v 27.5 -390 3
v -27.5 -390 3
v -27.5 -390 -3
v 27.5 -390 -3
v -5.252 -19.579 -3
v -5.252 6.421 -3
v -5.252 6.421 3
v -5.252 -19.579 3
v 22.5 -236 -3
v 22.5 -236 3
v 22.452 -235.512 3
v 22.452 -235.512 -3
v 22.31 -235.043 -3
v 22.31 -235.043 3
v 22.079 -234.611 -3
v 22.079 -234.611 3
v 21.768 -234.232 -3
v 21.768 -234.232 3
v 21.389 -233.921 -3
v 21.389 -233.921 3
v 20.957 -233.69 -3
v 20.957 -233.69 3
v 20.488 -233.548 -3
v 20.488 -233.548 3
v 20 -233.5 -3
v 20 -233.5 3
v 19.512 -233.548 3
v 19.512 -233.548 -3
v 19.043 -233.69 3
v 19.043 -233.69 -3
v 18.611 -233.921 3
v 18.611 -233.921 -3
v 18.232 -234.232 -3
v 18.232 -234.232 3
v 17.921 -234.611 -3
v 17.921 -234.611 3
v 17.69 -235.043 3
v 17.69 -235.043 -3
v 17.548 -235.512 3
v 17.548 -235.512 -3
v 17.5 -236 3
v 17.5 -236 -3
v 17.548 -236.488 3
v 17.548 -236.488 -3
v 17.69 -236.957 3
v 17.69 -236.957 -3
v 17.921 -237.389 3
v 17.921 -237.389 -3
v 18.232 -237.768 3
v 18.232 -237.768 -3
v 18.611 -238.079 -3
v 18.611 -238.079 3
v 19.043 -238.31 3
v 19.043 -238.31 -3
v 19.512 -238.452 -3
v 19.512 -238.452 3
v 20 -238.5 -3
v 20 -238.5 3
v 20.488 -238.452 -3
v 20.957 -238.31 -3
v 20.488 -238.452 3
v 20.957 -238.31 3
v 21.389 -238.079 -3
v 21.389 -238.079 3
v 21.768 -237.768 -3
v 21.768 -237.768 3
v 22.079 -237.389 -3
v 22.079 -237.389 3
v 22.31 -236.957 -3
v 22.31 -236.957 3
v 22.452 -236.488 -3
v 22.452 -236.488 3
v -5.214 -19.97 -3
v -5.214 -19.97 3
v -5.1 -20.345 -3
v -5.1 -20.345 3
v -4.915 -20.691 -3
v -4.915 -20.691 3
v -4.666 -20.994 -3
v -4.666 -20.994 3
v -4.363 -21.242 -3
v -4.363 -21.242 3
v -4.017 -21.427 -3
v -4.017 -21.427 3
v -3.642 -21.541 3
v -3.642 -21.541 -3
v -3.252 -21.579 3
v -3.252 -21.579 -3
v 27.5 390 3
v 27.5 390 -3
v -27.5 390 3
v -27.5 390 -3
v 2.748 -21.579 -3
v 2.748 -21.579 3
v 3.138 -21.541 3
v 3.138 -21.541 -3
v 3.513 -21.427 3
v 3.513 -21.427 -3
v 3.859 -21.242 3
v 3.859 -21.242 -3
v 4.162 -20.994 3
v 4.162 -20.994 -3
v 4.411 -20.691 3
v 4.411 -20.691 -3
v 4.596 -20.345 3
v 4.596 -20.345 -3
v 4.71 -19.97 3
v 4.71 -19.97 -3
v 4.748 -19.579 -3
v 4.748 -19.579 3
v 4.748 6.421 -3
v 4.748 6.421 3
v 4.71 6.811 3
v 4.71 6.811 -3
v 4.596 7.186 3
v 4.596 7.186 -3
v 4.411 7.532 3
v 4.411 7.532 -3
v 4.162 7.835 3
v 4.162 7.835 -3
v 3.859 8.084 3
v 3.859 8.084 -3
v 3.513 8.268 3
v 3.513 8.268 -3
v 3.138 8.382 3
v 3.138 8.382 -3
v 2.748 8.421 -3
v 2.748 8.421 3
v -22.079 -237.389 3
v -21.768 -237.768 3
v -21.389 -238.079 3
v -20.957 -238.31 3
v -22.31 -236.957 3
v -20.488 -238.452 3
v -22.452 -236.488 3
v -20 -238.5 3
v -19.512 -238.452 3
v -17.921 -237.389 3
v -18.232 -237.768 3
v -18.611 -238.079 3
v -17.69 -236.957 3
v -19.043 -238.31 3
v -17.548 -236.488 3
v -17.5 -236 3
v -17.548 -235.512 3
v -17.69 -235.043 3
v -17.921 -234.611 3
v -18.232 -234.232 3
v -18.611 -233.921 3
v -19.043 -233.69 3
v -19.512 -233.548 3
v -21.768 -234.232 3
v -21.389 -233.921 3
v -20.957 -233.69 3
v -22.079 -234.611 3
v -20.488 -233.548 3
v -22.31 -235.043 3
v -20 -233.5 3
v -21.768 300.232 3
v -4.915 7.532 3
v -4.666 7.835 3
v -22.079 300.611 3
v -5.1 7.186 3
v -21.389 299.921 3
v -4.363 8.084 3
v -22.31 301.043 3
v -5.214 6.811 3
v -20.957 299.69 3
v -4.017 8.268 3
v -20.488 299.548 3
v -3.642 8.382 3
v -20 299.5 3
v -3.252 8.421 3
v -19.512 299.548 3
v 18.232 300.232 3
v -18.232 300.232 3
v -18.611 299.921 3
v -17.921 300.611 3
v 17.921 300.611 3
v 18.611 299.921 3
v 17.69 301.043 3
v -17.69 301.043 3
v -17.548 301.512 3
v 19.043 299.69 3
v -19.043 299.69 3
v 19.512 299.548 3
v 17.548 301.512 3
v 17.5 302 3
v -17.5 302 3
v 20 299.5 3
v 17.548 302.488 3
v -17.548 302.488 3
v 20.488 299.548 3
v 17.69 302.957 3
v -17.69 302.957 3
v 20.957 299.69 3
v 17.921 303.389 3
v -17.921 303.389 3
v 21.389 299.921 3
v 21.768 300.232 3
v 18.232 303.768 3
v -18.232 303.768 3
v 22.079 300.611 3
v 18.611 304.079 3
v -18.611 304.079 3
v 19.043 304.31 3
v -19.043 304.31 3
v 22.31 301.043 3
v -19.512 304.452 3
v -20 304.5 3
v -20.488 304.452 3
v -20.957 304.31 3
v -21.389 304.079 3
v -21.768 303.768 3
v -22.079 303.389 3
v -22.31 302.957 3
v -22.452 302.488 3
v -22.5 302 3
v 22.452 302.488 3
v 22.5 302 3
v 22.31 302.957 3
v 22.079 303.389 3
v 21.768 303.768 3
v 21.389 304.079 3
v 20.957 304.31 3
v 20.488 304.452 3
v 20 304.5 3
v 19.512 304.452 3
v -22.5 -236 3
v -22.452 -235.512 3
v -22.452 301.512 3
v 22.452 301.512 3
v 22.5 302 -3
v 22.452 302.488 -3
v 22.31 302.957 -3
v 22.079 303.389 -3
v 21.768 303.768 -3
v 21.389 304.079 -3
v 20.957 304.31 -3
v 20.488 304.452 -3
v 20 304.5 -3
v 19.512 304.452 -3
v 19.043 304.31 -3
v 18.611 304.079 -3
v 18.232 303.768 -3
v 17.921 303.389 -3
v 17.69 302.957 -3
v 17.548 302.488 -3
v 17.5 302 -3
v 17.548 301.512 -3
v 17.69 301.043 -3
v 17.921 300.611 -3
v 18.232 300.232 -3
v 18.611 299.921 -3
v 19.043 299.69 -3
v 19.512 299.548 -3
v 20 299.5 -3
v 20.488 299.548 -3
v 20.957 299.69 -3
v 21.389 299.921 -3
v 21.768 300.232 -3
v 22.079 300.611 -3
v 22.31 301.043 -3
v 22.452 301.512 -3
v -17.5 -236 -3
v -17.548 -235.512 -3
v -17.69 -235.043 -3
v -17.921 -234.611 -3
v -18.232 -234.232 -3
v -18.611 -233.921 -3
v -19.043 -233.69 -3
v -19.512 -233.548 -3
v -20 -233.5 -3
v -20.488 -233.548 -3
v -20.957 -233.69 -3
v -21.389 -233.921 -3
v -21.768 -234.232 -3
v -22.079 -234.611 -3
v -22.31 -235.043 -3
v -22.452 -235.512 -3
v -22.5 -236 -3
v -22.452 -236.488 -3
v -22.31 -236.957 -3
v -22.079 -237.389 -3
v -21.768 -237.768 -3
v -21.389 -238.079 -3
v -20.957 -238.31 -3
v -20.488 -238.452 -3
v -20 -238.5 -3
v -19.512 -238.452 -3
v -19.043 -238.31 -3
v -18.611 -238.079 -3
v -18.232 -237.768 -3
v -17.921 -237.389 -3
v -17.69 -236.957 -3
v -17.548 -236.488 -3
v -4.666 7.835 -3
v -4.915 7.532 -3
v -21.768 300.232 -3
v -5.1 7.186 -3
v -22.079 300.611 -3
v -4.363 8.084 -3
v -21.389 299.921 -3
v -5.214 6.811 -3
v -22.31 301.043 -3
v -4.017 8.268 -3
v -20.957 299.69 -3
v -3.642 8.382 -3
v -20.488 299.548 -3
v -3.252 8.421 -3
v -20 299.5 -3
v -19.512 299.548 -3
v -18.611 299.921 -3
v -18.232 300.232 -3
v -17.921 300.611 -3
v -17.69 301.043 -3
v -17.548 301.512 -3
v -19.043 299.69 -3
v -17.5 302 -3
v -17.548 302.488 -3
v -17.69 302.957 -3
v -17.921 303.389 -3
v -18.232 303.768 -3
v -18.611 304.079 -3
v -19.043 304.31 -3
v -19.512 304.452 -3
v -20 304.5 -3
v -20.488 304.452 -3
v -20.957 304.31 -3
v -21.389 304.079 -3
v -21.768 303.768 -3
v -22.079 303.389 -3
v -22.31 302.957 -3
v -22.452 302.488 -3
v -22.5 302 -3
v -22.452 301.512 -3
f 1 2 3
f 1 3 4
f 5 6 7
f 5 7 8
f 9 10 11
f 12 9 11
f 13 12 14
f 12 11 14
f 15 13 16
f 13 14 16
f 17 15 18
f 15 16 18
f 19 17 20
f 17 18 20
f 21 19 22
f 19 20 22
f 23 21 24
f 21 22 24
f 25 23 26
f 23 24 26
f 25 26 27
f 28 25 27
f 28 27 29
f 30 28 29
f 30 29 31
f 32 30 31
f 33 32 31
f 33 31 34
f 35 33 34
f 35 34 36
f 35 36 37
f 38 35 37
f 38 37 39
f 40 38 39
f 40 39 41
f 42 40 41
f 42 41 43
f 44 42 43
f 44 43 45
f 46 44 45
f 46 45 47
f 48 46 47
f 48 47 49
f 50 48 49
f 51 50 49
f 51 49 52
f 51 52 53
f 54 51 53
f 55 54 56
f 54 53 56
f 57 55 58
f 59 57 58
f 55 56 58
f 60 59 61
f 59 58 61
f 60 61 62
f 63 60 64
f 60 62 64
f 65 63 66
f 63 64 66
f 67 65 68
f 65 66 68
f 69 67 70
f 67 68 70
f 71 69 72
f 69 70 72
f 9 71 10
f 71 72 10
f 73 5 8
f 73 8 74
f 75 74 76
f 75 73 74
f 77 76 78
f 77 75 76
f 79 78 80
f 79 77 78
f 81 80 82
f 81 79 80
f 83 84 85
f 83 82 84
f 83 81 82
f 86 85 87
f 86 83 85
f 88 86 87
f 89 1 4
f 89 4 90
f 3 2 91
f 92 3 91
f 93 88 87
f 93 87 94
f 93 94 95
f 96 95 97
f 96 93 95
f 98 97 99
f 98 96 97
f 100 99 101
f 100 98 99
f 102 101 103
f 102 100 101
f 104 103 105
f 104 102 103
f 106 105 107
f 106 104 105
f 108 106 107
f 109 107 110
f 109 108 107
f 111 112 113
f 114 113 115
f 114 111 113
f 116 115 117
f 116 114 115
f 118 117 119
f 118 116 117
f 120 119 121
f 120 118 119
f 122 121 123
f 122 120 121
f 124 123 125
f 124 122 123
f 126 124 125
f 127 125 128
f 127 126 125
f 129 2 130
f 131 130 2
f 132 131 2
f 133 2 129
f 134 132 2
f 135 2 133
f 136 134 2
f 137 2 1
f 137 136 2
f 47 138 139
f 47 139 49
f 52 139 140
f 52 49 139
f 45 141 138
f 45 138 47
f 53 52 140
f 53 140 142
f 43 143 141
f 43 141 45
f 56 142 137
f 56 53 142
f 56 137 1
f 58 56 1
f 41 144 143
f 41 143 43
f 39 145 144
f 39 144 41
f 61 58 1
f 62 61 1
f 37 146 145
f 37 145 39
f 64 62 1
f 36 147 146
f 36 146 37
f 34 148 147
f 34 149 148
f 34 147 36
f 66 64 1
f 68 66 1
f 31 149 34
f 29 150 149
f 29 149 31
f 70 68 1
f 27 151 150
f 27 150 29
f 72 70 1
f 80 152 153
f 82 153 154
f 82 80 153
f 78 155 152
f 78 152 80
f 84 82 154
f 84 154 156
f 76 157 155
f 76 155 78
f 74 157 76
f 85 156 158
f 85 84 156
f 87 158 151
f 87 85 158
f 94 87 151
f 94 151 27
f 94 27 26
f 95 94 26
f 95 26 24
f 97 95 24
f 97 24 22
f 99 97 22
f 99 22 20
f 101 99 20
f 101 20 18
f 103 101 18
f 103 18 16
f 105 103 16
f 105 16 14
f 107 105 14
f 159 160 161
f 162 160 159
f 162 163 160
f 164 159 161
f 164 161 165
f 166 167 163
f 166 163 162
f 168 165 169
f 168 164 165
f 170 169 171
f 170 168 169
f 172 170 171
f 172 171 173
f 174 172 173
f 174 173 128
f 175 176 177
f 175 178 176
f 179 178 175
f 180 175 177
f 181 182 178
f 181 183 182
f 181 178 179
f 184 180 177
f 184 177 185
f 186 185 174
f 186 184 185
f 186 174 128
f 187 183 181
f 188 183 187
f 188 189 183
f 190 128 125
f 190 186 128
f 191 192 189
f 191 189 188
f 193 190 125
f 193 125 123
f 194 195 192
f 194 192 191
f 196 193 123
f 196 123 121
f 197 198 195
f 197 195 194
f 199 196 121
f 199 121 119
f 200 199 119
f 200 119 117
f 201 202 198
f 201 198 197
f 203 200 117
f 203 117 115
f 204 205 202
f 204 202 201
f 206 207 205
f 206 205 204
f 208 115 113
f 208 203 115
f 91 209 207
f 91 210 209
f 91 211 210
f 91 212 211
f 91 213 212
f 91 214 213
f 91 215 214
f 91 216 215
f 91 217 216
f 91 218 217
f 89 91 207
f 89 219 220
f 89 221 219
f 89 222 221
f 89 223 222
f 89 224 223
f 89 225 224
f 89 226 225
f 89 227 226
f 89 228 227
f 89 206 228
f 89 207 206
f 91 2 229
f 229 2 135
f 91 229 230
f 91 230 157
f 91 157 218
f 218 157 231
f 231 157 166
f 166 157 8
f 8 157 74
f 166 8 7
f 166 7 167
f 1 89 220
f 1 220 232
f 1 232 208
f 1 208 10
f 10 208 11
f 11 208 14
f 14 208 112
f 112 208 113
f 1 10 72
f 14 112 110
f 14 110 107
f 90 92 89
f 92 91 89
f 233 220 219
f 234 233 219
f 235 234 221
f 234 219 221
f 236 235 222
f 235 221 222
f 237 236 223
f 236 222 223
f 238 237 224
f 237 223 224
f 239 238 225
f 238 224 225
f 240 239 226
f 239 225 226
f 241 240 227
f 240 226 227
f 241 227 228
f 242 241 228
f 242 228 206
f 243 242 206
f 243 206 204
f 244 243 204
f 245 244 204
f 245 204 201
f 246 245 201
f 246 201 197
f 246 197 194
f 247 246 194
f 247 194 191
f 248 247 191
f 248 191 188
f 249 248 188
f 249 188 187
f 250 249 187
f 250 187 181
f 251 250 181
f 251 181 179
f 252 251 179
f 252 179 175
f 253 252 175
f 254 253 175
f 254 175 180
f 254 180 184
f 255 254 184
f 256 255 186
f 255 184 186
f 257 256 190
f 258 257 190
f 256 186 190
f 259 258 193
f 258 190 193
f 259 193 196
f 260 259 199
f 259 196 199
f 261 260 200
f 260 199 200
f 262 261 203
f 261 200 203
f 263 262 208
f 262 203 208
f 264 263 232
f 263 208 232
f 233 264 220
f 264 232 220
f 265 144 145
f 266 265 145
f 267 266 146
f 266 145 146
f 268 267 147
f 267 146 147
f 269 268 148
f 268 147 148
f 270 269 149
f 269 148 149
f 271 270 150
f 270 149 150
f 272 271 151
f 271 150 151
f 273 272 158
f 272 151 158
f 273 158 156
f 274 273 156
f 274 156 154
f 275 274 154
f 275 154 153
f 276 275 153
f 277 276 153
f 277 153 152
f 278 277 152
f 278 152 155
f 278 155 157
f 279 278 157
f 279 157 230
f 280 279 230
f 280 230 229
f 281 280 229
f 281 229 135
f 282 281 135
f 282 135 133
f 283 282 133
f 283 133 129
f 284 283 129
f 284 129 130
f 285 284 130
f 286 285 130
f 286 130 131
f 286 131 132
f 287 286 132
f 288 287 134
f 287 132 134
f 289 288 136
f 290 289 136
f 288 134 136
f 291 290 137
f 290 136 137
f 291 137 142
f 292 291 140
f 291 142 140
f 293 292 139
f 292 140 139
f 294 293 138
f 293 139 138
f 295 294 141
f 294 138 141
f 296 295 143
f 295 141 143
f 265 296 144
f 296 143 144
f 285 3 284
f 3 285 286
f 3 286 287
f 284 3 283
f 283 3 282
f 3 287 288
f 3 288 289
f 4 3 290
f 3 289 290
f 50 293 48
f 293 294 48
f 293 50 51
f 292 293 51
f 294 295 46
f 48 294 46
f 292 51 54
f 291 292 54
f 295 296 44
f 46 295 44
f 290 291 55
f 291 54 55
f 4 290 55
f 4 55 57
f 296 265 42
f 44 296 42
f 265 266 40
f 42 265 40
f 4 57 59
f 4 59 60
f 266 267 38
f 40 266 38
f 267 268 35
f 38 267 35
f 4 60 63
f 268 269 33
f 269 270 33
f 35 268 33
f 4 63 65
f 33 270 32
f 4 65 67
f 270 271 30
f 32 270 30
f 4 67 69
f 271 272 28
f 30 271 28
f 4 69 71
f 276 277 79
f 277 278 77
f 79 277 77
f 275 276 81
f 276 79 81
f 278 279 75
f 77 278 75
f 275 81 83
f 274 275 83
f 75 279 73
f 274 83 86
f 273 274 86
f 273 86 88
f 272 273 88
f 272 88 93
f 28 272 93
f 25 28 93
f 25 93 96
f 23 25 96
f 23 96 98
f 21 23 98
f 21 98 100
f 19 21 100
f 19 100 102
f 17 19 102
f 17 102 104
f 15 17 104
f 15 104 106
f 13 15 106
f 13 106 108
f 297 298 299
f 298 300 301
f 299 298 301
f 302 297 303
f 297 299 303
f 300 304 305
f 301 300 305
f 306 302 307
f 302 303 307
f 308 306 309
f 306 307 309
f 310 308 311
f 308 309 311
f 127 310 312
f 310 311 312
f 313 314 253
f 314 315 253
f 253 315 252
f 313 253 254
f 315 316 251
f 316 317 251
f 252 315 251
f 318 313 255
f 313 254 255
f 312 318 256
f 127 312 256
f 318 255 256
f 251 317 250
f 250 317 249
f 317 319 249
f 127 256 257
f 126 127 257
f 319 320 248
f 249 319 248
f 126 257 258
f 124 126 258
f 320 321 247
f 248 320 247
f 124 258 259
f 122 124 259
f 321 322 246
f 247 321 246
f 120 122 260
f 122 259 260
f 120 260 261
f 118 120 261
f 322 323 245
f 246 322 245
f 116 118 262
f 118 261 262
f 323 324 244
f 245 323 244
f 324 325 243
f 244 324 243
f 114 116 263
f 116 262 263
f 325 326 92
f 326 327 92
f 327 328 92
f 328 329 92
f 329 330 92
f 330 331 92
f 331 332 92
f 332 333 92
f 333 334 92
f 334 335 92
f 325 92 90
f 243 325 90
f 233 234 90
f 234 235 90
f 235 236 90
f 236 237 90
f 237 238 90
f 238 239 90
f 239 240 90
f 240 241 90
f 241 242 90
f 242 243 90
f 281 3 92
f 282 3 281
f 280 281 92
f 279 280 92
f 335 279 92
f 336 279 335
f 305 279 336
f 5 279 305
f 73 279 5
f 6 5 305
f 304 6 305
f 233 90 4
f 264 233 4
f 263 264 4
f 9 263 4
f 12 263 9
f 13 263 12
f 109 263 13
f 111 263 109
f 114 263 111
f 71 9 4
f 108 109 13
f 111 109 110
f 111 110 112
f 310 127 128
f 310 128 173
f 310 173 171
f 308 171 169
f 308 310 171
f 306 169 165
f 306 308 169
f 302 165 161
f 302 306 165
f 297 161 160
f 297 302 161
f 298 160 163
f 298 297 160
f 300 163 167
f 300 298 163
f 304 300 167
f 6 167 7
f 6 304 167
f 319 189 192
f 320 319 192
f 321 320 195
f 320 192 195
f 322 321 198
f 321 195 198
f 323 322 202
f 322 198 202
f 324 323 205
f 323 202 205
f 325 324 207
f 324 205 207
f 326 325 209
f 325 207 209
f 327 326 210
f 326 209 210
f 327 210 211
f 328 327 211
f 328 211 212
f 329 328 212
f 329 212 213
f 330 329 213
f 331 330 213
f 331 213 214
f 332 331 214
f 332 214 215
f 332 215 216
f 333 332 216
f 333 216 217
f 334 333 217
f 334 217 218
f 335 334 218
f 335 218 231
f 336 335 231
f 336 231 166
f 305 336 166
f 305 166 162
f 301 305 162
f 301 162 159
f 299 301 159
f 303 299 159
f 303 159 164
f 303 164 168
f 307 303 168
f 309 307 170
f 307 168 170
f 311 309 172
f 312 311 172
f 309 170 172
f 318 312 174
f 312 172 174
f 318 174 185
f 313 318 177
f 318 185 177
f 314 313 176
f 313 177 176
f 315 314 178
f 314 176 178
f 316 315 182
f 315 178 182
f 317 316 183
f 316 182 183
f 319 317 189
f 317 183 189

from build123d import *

# Parameters (mm, degrees)
SKETCH_1_W             = 55
SKETCH_1_H             = 780
EXTRUDE_1_DEPTH        = 3
CUT_EXTRUDE_1_DEPTH    = 7
HOLE_WIZARD_M6_1_D     = 5
HOLE_WIZARD_M6_1_DEPTH = 17
HOLE_WIZARD_M6_1_TIP   = 1.502151548


with BuildPart() as part:
    # 草图1 → 凸台-拉伸1 (new body, symmetric)
    with BuildSketch(Plane.XY):
        Rectangle(SKETCH_1_W, SKETCH_1_H)
    extrude(amount=EXTRUDE_1_DEPTH, both=True)

    # 草图4 → 切除-拉伸1 (cut, through all)
    with BuildSketch(Plane(origin=(0, 0, -3), x_dir=(-1, 0, 0), z_dir=(0, 0, -1))):
        with BuildLine():
            Line((3.251986045, -21.579414933), (-2.748013955, -21.579414933))
            ThreePointArc((-2.748013955, -21.579414933), (-4.162227517, -20.993628496), (-4.748013955, -19.579414933))
            Line((-4.748013955, -19.579414933), (-4.748013955, 6.420585067))
            ThreePointArc((-4.748013955, 6.420585067), (-4.162227517, 7.834798629), (-2.748013955, 8.420585067))
            Line((-2.748013955, 8.420585067), (3.251986045, 8.420585067))
            ThreePointArc((3.251986045, 8.420585067), (4.666199608, 7.834798629), (5.251986045, 6.420585067))
            Line((5.251986045, 6.420585067), (5.251986045, -19.579414933))
            ThreePointArc((5.251986045, -19.579414933), (4.666199608, -20.993628496), (3.251986045, -21.579414933))
        make_face()
    extrude(amount=-CUT_EXTRUDE_1_DEPTH, mode=Mode.SUBTRACT)

    # M6 螺纹孔1
    with Locations(Plane(origin=(0, 0, -3), x_dir=(-1, 0, 0), z_dir=(0, 0, -1))):
        with Locations((20, 302), (-20, 302), (20, -236), (-20, -236)):
            Hole(HOLE_WIZARD_M6_1_D / 2, depth=HOLE_WIZARD_M6_1_DEPTH)
            with Locations((0, 0, -(HOLE_WIZARD_M6_1_DEPTH + HOLE_WIZARD_M6_1_TIP / 2))):  # 118° drill point
                Cone(0, HOLE_WIZARD_M6_1_D / 2, HOLE_WIZARD_M6_1_TIP, mode=Mode.SUBTRACT)


solid = part.part
